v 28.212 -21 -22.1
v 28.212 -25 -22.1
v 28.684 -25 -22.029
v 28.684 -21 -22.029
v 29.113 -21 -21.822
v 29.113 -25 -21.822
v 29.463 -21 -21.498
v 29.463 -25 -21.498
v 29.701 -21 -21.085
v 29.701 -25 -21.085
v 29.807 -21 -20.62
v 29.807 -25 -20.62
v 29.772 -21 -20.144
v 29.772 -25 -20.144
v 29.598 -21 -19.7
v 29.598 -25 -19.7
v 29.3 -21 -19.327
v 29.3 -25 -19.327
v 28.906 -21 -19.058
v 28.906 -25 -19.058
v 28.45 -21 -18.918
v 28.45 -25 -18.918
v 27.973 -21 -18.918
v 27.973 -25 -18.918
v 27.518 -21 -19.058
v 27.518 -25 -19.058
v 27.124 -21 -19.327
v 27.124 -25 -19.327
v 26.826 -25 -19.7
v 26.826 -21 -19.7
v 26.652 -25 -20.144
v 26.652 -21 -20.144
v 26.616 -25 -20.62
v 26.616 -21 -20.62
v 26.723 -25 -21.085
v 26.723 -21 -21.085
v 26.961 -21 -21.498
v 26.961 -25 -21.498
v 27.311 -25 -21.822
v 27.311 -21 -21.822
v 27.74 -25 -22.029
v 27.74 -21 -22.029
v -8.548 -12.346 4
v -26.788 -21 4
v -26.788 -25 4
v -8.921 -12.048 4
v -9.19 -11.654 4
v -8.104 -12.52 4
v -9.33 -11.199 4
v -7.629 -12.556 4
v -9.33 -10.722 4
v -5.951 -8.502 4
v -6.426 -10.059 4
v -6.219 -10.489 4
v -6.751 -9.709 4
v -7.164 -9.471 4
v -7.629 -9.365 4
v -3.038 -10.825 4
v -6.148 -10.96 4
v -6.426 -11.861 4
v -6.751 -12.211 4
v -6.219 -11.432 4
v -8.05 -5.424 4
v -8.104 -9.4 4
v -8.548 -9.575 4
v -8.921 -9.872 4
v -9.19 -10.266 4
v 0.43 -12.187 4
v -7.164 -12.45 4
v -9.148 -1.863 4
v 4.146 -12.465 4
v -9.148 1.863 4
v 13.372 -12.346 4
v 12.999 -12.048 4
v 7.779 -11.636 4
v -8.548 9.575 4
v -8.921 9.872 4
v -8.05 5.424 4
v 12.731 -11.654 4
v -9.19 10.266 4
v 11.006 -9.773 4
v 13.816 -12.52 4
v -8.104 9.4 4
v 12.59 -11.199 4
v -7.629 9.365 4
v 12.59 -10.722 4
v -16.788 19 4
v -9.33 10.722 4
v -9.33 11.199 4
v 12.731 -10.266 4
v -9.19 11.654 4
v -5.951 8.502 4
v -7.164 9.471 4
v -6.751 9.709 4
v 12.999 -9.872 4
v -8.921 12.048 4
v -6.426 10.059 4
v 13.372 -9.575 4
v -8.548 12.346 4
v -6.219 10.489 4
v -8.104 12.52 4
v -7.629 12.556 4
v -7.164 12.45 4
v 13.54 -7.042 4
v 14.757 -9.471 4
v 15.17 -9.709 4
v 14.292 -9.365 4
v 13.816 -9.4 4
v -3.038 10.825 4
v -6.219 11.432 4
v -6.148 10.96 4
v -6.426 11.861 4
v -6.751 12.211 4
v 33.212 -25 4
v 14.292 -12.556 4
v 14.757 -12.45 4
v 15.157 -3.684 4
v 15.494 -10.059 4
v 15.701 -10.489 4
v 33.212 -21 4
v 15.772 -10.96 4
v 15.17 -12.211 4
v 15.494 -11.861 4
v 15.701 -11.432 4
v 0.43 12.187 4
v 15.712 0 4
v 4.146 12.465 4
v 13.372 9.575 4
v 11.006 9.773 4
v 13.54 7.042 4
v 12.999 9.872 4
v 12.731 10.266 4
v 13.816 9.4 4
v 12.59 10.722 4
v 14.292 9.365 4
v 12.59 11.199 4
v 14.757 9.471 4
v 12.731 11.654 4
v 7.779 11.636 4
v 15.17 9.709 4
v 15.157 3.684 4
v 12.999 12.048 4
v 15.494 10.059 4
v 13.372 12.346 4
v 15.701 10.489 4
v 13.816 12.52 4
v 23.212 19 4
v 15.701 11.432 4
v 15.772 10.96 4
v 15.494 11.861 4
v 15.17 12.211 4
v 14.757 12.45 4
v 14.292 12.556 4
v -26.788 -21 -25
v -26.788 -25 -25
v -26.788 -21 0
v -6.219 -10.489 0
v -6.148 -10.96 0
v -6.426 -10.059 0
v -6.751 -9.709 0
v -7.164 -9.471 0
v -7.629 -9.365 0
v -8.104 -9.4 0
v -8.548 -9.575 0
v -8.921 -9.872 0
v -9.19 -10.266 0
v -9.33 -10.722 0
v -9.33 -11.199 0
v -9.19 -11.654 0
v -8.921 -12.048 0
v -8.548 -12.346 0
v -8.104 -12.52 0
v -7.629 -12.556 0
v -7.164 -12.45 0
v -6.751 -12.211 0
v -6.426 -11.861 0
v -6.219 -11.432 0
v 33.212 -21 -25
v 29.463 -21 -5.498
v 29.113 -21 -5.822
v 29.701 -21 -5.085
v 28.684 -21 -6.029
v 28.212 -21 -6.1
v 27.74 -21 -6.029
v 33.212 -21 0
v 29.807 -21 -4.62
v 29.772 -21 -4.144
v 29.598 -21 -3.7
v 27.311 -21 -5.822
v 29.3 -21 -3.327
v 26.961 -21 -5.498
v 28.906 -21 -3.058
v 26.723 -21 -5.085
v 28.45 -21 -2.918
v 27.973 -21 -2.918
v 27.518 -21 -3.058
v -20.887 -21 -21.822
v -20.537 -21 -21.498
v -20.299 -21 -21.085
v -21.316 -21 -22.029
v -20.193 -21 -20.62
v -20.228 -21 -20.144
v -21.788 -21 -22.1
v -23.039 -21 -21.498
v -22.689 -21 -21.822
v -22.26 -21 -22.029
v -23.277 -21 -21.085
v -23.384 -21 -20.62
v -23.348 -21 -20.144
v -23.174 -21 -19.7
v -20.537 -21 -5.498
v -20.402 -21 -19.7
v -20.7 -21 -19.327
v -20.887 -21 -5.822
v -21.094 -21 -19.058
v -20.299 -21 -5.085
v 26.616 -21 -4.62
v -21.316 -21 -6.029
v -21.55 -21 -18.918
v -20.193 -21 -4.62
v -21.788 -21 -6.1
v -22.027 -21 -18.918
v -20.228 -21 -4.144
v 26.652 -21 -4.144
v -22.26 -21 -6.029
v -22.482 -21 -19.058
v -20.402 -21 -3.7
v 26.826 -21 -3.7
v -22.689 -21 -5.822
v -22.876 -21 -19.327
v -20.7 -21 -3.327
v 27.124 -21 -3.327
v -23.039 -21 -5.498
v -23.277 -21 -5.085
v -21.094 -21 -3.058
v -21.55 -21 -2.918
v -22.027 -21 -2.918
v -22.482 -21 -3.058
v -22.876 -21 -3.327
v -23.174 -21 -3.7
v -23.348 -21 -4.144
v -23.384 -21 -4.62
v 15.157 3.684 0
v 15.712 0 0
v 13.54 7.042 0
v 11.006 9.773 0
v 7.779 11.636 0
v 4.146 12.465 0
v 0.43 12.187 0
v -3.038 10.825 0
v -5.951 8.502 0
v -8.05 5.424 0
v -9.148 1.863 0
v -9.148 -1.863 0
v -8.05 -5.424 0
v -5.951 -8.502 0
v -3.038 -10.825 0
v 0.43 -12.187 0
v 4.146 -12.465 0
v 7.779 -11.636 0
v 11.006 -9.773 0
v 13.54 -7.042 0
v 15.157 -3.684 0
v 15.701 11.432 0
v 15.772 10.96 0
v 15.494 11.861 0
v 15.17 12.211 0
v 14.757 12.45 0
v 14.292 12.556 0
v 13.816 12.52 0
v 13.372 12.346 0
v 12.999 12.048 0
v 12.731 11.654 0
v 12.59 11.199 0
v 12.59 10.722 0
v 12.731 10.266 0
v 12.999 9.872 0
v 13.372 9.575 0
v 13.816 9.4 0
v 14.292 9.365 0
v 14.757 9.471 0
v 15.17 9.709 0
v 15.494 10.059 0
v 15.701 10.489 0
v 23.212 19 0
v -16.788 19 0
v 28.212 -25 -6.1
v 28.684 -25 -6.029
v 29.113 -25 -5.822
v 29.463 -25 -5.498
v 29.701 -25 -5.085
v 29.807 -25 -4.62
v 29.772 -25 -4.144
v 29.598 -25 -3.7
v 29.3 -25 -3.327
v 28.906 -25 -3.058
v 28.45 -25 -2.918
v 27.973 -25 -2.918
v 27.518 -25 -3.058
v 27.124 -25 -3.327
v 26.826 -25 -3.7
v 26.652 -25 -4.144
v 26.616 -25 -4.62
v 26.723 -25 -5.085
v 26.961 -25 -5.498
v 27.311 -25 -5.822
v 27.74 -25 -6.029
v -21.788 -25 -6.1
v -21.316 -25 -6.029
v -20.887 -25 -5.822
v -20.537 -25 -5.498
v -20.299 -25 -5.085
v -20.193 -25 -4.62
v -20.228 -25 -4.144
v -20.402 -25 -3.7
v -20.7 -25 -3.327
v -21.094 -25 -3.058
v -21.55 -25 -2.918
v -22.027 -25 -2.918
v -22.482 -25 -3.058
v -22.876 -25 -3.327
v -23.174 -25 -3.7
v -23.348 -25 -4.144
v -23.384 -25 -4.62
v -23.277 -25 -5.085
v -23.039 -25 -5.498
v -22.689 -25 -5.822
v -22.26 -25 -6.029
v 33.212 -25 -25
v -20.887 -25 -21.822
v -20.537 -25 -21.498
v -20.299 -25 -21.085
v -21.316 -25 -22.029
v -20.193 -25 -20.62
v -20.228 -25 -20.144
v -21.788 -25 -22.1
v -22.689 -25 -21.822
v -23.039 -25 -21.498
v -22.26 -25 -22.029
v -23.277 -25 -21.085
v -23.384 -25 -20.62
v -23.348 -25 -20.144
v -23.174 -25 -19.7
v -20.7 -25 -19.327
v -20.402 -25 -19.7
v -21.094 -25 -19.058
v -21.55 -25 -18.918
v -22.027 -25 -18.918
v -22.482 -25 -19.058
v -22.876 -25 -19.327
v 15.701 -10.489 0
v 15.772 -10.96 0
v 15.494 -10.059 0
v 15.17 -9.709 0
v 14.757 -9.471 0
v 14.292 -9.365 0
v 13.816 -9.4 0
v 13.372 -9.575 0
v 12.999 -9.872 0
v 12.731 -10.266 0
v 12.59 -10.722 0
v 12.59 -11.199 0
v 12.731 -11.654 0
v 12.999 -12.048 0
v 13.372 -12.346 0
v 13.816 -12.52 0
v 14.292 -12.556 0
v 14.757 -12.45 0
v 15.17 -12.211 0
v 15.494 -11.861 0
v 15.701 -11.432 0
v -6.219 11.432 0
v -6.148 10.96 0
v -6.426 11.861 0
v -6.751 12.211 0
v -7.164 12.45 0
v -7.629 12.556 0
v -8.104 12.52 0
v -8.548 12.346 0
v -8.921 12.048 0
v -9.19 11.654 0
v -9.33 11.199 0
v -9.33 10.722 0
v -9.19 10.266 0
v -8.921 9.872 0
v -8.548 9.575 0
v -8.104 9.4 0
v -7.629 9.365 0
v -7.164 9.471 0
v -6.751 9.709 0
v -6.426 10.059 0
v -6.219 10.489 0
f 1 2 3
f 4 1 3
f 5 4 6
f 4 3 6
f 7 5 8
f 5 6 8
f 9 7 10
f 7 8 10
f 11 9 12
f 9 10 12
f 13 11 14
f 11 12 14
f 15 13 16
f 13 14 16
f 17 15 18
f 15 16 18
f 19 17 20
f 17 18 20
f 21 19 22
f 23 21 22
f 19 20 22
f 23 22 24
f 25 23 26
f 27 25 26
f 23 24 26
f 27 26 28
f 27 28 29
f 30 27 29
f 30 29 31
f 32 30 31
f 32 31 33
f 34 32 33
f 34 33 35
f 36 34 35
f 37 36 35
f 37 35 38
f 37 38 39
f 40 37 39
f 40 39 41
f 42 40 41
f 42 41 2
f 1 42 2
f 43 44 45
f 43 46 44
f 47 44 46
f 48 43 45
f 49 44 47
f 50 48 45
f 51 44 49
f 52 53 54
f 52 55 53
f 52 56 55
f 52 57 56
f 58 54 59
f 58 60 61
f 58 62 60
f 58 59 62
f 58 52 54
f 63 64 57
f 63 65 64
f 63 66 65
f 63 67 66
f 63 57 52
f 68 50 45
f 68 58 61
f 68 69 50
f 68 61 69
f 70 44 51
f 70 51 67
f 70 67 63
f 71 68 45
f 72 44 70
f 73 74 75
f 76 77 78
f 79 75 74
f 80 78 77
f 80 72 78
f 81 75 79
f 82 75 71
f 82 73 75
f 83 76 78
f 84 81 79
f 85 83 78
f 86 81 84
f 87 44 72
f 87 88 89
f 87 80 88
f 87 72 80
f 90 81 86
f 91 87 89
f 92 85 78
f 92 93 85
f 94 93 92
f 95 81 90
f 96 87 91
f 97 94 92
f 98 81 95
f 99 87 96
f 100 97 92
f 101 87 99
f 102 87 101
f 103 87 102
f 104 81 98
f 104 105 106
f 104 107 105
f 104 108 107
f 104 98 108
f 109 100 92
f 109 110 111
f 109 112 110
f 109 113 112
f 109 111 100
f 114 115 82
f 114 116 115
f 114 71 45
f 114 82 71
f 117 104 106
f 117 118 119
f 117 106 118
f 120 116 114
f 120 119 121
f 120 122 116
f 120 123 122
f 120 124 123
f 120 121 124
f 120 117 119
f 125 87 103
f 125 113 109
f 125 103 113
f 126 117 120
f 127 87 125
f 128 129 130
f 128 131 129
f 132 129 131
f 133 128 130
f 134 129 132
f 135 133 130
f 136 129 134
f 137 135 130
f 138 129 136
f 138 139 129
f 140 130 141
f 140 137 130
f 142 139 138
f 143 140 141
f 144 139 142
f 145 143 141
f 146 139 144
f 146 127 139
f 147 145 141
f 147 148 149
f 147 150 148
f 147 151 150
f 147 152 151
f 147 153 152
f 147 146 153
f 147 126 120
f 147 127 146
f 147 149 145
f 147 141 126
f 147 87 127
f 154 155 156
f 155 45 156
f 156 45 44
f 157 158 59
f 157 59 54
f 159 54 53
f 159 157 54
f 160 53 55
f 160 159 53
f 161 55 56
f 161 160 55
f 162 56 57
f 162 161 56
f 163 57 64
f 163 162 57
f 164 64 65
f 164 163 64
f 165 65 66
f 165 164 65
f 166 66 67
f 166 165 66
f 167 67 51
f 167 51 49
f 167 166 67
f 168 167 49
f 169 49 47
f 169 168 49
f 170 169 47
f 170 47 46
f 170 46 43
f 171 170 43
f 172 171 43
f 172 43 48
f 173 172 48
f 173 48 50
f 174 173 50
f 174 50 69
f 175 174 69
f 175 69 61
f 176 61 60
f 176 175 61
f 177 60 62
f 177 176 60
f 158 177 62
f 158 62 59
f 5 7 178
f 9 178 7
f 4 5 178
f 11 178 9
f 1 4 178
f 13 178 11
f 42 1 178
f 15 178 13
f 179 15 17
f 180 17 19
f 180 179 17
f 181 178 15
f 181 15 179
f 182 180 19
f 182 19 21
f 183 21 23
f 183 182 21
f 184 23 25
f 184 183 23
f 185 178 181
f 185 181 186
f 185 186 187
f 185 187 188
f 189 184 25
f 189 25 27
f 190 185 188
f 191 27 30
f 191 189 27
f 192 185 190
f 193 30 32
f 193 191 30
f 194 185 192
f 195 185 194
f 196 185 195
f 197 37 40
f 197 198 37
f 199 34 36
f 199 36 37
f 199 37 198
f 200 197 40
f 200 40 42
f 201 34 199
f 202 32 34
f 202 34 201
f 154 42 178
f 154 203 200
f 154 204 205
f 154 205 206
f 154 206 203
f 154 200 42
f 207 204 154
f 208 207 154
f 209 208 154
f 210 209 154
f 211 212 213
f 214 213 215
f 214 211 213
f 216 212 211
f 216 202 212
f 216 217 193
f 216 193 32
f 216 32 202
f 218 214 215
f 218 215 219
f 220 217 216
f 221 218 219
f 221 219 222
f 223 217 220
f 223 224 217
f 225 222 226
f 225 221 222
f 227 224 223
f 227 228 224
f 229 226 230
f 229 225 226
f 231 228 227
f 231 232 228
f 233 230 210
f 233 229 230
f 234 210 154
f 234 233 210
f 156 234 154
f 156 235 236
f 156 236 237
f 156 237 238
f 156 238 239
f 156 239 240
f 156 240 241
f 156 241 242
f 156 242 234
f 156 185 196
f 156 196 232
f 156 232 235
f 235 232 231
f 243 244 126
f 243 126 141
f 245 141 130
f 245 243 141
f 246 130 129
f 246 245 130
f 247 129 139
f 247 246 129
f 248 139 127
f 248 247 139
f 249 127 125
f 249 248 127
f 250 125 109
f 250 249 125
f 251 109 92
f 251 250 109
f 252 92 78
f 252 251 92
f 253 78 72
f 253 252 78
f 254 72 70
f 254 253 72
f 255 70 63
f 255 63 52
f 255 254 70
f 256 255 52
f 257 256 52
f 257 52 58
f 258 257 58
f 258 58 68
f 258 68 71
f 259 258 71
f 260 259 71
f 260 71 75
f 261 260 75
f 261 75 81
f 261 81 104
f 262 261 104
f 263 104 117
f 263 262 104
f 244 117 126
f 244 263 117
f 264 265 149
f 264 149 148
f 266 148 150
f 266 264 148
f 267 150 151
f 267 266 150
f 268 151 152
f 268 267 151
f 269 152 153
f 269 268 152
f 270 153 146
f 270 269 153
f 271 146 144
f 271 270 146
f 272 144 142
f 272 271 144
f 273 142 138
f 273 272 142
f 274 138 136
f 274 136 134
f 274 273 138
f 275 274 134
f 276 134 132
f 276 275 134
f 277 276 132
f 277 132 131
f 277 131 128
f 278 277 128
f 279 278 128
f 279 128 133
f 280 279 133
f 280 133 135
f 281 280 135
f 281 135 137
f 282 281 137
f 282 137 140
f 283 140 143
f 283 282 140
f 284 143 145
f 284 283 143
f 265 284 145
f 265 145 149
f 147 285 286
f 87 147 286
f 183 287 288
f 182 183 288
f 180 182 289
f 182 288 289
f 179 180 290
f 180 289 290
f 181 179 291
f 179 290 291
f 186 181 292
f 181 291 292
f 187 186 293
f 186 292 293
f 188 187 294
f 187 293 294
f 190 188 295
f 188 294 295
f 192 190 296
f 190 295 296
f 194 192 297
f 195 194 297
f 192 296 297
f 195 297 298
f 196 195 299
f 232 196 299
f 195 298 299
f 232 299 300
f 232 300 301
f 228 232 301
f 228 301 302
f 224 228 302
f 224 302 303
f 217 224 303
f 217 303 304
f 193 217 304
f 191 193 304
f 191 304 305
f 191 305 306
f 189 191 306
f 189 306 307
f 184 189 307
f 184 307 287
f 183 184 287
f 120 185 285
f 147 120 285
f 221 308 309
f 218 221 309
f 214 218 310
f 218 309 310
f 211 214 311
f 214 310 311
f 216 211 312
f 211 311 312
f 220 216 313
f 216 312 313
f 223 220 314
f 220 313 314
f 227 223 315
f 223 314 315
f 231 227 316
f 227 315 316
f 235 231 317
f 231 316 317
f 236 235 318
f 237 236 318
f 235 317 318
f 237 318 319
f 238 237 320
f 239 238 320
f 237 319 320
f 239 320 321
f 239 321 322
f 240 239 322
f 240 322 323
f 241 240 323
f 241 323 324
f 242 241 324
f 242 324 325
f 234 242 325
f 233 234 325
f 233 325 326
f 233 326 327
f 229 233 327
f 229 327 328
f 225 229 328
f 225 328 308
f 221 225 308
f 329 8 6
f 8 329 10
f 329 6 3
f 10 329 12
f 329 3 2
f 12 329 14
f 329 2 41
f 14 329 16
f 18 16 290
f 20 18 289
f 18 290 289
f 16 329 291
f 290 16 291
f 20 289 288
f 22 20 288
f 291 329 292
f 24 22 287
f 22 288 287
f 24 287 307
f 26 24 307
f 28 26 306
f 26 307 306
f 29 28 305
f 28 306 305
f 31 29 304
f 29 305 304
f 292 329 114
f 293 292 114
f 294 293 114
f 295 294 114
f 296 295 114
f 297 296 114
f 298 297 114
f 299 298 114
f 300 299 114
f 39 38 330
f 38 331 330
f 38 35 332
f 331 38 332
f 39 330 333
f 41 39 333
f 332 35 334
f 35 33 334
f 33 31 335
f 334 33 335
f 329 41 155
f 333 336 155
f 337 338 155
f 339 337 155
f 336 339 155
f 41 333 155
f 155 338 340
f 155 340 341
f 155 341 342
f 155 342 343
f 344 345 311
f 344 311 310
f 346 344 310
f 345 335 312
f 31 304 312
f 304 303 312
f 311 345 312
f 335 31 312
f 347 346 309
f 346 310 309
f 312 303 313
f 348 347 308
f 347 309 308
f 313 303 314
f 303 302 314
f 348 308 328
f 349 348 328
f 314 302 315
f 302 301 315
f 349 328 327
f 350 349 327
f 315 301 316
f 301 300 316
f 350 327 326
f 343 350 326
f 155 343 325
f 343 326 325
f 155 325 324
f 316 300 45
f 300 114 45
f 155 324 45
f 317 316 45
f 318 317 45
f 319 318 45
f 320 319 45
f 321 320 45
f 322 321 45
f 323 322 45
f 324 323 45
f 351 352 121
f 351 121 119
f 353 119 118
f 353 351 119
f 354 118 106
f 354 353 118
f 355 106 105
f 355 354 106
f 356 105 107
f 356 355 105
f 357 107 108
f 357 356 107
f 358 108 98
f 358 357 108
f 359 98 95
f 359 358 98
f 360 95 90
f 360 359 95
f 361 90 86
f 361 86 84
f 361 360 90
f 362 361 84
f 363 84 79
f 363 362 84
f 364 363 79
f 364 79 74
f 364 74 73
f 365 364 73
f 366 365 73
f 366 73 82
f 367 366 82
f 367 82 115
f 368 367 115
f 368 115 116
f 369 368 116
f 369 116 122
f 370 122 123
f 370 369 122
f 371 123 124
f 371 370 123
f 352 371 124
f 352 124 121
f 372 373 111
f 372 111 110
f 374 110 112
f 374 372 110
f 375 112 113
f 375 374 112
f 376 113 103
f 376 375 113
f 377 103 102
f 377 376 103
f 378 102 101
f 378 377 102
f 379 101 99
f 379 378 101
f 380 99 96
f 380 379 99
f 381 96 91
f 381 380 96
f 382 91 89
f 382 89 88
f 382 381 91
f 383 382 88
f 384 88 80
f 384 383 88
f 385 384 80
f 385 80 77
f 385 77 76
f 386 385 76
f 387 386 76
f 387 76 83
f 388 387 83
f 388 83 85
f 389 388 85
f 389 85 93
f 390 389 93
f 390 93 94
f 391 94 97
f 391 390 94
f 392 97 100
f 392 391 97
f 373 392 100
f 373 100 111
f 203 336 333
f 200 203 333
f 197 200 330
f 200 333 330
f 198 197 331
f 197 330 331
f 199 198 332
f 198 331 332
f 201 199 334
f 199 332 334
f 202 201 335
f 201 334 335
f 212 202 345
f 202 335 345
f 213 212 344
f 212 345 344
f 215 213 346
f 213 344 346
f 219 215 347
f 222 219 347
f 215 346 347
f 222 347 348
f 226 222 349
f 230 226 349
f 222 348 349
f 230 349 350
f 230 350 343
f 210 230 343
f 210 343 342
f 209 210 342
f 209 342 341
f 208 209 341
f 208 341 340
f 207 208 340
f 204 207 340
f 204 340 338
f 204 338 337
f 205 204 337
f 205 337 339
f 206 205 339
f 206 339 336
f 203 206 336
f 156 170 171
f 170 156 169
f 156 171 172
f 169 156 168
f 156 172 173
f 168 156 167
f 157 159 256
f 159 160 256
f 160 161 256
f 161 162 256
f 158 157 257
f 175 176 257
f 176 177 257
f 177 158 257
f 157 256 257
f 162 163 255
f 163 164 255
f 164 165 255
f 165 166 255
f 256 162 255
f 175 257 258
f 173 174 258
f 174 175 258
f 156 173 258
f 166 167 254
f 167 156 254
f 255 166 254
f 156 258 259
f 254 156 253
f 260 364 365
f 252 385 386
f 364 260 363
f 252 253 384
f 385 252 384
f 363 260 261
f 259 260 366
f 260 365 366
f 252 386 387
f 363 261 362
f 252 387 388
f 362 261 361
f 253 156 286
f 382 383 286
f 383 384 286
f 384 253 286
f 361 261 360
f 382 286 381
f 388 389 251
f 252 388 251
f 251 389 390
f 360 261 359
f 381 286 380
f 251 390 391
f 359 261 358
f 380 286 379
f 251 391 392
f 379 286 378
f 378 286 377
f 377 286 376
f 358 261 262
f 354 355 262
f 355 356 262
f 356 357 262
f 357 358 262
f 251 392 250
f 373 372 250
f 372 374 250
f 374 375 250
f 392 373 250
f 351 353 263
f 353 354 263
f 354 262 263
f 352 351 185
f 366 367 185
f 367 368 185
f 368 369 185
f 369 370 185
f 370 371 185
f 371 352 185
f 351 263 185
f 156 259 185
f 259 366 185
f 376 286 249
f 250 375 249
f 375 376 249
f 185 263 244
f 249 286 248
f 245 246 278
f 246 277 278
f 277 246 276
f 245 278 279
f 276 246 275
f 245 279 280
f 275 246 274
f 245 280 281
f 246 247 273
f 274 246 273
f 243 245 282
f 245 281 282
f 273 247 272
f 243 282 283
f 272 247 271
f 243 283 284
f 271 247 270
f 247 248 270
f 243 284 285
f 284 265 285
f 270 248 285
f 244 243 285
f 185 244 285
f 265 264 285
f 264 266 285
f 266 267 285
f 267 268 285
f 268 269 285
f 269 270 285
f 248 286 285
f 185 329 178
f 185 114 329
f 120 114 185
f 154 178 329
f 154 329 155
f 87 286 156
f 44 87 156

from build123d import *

# Parameters (mm, degrees)
SKETCH_2_R          = 1.6
SKETCH_2_R_2        = 12.5
SKETCH_2_W          = 60
SKETCH_2_H          = 4
EXTRUDE_1_DEPTH     = 4
SKETCH_3_W          = 60
SKETCH_3_H          = 4
EXTRUDE_2_DEPTH     = 25
SKETCH_4_R          = 1.6
CUT_EXTRUDE_1_DEPTH = 25


with BuildPart() as part:
    # 草图2 → 凸台-拉伸1 (new body)
    # profile 1 of 2: a face of its own
    with BuildSketch(Plane.XY):
        Polygon((23.211946481, 19), (-16.788053519, 19), (-26.788053519, -21), (33.211946481, -21), align=None)
        with Locations((14.172101589, -10.960155108)):
            Circle(SKETCH_2_R, mode=Mode.SUBTRACT)
        with Locations((-7.748208627, -10.960155108)):
            Circle(SKETCH_2_R, mode=Mode.SUBTRACT)
        with Locations((-7.748208627, 10.960155108)):
            Circle(SKETCH_2_R, mode=Mode.SUBTRACT)
        with Locations((3.211946481, 0)):
            Circle(SKETCH_2_R_2, mode=Mode.SUBTRACT)
        with Locations((14.172101589, 10.960155108)):
            Circle(SKETCH_2_R, mode=Mode.SUBTRACT)
    # profile 2 of 2: a face of its own
    with BuildSketch(Plane.XY):
        with Locations((3.211946481, -23)):
            Rectangle(SKETCH_2_W, SKETCH_2_H)
    extrude(amount=EXTRUDE_1_DEPTH)

    # 草图3 → 凸台-拉伸2 (add)
    with BuildSketch(Plane(origin=(0, 0, 0), x_dir=(-1, 0, 0), z_dir=(0, 0, -1))):
        with Locations((-3.211946481, -23)):
            Rectangle(SKETCH_3_W, SKETCH_3_H)
    extrude(amount=EXTRUDE_2_DEPTH)

    # 草图4 → 切除-拉伸1 (cut)
    with BuildSketch(Plane.XZ.offset(25)):
        with Locations(Location((-21.788053519, -4.5, 0), (0, 0, 270))):
            Circle(SKETCH_4_R)
        with Locations(Location((28.211946481, -4.5, 0), (0, 0, 270))):
            Circle(SKETCH_4_R)
        with Locations(Location((28.211946481, -20.5, 0), (0, 0, 270))):
            Circle(SKETCH_4_R)
        with Locations(Location((-21.788053519, -20.5, 0), (0, 0, 270))):
            Circle(SKETCH_4_R)
    extrude(amount=-CUT_EXTRUDE_1_DEPTH, mode=Mode.SUBTRACT)


solid = part.part
